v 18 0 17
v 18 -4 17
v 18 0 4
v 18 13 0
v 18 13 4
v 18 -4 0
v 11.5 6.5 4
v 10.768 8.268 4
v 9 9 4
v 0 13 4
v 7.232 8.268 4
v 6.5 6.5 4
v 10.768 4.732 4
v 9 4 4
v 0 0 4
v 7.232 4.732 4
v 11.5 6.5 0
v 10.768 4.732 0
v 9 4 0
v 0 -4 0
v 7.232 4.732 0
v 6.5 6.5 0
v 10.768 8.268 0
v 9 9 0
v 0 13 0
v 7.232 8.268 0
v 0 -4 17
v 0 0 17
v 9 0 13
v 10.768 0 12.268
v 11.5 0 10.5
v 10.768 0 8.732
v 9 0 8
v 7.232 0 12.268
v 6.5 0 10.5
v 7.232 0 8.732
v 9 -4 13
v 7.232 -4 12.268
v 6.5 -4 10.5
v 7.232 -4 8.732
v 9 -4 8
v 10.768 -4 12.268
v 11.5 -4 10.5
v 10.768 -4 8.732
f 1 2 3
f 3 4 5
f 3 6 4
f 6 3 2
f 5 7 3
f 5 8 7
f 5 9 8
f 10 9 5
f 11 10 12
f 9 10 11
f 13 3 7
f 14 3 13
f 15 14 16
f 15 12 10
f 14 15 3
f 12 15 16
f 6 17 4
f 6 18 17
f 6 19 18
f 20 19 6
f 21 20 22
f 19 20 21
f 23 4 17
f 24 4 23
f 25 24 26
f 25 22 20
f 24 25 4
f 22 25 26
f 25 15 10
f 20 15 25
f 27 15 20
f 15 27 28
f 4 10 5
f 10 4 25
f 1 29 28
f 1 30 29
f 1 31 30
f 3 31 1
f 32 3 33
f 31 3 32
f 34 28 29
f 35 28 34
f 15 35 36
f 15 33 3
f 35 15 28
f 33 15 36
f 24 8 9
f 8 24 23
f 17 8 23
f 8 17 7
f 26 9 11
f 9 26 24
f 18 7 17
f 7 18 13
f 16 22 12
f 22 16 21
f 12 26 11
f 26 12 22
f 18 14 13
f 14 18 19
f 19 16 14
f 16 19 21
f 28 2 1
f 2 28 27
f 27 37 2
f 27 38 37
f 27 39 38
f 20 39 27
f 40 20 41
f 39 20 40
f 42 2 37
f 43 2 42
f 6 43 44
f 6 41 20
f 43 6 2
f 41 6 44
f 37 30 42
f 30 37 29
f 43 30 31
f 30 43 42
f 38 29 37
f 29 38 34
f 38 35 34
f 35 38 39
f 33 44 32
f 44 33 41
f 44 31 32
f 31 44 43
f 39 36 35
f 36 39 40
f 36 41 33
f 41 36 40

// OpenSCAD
/*
file: i3-fan-mount-v1.scad
author: gregor binder <gregor_reprap@catrix.at>
date: 7.11.2013
license: CC BY-NC-SA 3.0
*/

hole=5;
thickness=4;
width=hole+thickness+thickness+5;
lenght=hole+thickness+thickness;

union() {
difference() {
	cube([width,lenght,thickness]);
	translate([width/2,lenght/2,-0.5])
		cylinder(h=thickness+1,r=hole/2);
}
difference() {
	translate([0,-thickness,0])
		cube([width,thickness,lenght+thickness]);
	translate([width/2,0.5,lenght/2+thickness])
		rotate([90,0,0])
			cylinder(h=thickness+1,r=hole/2);
}
}
